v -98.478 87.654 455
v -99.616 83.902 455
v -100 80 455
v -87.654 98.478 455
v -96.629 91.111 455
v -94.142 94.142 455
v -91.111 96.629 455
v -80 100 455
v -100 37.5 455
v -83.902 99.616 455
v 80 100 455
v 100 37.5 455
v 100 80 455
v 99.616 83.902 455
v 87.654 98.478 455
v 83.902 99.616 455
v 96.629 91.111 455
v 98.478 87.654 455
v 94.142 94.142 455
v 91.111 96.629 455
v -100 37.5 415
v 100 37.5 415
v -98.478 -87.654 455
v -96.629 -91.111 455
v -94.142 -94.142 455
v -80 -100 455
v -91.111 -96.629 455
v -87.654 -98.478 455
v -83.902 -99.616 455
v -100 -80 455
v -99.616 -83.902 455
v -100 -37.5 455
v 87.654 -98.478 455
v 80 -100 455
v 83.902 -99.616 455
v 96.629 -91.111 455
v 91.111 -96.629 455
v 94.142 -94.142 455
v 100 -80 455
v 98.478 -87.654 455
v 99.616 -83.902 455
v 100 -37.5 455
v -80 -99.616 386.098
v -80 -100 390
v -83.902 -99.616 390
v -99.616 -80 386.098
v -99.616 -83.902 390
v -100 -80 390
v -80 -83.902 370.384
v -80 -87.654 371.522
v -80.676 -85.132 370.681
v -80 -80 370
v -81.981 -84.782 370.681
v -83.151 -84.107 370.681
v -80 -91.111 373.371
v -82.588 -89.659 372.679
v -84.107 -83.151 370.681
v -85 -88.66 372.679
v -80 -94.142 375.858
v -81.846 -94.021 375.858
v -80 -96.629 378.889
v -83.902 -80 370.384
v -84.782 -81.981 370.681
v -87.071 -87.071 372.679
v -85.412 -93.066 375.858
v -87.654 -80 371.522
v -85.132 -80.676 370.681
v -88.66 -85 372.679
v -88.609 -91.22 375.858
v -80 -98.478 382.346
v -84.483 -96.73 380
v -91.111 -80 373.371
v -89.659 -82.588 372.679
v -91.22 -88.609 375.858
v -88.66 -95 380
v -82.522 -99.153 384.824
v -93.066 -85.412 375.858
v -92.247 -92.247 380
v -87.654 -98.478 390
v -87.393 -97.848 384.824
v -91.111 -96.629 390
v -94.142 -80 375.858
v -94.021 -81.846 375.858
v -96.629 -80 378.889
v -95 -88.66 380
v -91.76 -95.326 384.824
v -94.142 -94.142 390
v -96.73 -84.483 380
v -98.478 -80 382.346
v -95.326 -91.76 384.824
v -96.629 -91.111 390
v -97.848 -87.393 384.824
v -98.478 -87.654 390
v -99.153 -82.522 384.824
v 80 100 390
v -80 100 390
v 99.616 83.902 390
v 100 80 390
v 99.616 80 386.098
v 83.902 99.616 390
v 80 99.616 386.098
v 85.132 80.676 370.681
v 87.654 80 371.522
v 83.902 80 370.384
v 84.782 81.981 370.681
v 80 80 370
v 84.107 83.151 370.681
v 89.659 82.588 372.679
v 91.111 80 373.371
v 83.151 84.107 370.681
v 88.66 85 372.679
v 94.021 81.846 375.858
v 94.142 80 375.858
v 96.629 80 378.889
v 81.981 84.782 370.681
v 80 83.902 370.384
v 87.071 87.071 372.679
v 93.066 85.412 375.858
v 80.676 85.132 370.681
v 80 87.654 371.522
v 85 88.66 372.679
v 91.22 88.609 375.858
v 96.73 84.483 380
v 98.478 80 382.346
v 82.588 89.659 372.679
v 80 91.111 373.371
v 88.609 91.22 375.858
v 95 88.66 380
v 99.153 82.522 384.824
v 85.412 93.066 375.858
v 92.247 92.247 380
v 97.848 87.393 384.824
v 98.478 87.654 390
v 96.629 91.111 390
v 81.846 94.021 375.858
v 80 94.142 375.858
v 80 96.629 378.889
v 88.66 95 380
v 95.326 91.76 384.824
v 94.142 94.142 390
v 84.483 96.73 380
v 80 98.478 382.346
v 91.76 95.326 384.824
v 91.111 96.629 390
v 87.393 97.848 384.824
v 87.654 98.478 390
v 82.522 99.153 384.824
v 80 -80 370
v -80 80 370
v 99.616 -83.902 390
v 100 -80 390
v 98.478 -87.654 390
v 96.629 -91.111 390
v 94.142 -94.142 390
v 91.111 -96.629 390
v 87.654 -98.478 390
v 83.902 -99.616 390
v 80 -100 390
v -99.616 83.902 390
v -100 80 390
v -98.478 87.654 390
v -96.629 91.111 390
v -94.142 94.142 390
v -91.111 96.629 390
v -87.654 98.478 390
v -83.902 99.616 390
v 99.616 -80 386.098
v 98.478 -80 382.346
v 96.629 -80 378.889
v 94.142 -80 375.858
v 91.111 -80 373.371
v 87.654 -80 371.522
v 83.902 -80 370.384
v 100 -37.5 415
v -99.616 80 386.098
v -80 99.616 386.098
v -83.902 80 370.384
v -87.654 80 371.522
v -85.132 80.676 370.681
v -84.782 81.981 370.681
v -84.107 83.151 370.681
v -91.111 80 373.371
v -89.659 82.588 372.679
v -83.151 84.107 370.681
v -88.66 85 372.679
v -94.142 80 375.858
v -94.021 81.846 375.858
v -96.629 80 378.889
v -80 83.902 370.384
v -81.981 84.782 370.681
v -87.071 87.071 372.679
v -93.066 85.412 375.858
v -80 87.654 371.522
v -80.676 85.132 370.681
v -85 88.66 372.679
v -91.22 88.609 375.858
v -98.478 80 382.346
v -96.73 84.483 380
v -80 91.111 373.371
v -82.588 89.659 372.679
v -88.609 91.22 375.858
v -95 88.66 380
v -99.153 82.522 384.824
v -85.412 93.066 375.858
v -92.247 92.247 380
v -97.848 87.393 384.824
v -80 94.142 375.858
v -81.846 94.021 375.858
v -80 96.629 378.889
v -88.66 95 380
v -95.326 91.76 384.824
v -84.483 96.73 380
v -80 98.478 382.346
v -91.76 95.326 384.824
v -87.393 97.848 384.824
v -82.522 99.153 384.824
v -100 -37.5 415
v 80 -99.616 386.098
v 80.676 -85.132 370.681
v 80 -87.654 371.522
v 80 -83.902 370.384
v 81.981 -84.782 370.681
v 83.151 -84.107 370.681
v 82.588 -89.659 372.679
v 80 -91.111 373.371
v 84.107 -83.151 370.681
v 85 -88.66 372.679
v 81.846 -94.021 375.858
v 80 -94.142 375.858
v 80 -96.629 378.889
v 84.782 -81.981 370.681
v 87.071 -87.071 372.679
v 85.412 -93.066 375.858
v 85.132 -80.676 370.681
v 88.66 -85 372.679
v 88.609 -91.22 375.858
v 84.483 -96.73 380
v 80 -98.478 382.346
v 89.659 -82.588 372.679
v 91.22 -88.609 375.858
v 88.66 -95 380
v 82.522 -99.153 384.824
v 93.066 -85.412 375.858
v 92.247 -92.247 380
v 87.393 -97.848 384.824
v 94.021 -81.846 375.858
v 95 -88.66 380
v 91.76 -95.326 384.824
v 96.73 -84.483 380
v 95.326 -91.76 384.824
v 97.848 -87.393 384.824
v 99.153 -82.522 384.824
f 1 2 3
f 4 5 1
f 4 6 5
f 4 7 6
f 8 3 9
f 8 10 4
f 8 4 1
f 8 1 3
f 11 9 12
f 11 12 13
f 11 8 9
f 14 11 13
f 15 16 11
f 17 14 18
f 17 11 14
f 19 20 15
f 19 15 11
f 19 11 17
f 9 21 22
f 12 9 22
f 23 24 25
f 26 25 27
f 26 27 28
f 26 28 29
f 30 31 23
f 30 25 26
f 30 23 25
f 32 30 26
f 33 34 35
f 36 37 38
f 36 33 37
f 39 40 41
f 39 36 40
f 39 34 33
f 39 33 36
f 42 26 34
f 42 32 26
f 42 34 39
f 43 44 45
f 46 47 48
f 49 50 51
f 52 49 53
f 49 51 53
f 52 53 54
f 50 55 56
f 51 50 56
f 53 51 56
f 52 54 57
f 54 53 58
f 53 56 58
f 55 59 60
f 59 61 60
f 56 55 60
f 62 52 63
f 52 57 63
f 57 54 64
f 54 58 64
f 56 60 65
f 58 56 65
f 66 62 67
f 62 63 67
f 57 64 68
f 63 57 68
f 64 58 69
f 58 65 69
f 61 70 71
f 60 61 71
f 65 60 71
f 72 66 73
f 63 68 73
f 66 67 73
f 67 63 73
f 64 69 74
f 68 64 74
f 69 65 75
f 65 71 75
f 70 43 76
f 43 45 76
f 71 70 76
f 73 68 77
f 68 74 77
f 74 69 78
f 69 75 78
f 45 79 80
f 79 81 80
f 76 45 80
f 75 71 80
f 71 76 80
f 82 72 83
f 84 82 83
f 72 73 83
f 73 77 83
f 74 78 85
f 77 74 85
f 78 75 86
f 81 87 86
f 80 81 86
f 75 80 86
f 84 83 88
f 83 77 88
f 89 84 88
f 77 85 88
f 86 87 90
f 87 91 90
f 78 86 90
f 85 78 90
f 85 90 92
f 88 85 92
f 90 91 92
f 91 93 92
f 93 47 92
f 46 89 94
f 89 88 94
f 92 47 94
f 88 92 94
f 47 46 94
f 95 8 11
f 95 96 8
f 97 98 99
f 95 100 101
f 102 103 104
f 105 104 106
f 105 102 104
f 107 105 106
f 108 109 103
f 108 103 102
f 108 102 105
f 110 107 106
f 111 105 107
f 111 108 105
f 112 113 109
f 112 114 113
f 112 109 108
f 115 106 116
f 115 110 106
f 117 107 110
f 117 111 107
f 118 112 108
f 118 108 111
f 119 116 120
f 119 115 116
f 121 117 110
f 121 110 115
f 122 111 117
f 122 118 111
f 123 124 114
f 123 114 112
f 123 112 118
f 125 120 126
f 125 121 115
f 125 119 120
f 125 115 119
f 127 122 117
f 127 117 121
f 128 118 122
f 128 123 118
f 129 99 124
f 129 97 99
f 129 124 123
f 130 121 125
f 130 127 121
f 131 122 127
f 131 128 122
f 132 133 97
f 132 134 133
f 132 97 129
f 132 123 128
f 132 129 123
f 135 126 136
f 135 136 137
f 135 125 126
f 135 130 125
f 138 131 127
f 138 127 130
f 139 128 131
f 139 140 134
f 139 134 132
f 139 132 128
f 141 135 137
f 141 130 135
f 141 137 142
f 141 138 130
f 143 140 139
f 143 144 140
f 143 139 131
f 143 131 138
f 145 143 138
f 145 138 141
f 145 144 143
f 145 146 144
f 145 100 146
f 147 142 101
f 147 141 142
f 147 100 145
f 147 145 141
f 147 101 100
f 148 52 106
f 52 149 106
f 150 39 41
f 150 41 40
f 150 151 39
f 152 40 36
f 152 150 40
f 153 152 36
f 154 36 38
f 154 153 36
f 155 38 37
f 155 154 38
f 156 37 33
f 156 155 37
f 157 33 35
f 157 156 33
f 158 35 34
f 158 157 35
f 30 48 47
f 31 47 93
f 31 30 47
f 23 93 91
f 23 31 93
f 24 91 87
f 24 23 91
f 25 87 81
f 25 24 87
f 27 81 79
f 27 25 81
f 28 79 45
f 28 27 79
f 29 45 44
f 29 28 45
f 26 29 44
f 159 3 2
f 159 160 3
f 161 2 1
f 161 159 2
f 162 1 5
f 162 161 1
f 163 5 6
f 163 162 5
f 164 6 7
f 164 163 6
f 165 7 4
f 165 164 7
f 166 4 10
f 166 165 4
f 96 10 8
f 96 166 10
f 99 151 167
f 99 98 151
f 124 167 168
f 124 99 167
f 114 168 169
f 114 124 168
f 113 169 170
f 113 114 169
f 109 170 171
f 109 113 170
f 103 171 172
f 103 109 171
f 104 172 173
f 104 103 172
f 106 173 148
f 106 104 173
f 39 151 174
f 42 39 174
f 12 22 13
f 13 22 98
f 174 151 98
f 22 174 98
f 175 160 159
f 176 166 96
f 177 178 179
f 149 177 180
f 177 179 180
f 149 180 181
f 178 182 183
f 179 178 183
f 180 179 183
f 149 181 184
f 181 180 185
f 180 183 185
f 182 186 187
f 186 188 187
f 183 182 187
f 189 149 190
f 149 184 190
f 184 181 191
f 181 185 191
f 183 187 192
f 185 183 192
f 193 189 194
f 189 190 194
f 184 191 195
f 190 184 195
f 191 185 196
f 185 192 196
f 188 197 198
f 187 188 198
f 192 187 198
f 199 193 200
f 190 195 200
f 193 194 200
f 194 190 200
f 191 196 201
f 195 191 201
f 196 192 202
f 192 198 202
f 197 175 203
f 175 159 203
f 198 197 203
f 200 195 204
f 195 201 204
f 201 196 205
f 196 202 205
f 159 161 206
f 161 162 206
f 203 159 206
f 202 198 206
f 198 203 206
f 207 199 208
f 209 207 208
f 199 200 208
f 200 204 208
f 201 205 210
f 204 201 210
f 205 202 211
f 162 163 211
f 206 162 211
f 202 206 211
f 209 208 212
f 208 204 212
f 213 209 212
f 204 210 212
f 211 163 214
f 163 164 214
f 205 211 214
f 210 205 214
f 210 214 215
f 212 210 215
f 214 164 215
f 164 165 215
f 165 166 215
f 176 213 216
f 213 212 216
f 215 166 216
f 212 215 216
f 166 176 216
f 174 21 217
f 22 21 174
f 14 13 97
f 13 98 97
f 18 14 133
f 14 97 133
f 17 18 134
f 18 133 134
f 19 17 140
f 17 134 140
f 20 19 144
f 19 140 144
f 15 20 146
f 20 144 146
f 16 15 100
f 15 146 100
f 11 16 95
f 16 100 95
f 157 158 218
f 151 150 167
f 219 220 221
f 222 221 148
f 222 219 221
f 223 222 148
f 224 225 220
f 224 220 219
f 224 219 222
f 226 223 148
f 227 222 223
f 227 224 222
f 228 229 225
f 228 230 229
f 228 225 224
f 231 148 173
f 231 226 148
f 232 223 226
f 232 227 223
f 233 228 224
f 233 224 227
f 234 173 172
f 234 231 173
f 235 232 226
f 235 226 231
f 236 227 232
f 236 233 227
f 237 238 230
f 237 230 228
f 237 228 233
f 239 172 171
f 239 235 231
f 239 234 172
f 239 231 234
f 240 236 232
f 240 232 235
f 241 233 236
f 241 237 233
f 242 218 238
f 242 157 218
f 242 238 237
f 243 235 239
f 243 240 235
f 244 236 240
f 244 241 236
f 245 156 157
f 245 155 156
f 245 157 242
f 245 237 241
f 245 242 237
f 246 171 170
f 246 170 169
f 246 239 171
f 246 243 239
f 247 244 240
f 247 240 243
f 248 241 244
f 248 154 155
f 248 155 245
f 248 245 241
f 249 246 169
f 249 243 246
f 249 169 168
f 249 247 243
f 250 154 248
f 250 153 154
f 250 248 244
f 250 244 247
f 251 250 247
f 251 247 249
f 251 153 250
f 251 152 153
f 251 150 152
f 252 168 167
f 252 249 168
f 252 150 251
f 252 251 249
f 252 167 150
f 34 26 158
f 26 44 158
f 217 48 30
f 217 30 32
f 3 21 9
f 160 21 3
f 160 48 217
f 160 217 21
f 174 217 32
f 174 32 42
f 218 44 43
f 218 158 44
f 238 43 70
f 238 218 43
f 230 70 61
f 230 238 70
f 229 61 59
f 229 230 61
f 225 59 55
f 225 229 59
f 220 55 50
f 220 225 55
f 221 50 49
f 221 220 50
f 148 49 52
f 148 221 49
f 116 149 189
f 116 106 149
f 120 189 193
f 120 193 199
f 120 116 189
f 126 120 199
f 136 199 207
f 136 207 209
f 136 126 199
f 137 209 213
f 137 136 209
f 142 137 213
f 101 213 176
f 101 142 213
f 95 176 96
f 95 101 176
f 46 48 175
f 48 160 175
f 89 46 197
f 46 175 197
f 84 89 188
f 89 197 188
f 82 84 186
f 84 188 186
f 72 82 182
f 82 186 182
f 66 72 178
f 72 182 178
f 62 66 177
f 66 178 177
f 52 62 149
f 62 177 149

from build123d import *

# Parameters (mm, degrees)
SKETCH003_W  = 200
SKETCH003_H  = 200
PAD003_DEPTH = 45
SKETCH009_W  = 200
SKETCH009_H  = 62.5
PAD009_DEPTH = 40
FILLET005_R  = 20


with BuildPart() as part:
    # Sketch003 (on Face1 of CopyPad002) → Pad003 (new body)
    with BuildSketch(Plane.XY.offset(370)):
        Rectangle(SKETCH003_W, SKETCH003_H)
    extrude(amount=PAD003_DEPTH)

    # Sketch009 (on Face6 of Pad003) → Pad009 (join)
    with BuildSketch(Plane.XY.offset(415)):
        with Locations((0, 68.75)):
            Rectangle(SKETCH009_W, SKETCH009_H)
        with Locations((0, -68.75)):
            Rectangle(SKETCH009_W, SKETCH009_H)
    extrude(amount=PAD009_DEPTH)

    # Fillet005
    fillet005_edges = [part.edges().sort_by_distance(p)[0] for p in [
        (-100, -100, 412.5),
        (100, -100, 412.5),
        (100, 100, 412.5),
        (-100, 100, 412.5),
        (0, -100, 370),
        (100, 0, 370),
        (-100, 0, 370),
        (0, 100, 370),
    ]]
    fillet(fillet005_edges, radius=FILLET005_R)


solid = part.part
